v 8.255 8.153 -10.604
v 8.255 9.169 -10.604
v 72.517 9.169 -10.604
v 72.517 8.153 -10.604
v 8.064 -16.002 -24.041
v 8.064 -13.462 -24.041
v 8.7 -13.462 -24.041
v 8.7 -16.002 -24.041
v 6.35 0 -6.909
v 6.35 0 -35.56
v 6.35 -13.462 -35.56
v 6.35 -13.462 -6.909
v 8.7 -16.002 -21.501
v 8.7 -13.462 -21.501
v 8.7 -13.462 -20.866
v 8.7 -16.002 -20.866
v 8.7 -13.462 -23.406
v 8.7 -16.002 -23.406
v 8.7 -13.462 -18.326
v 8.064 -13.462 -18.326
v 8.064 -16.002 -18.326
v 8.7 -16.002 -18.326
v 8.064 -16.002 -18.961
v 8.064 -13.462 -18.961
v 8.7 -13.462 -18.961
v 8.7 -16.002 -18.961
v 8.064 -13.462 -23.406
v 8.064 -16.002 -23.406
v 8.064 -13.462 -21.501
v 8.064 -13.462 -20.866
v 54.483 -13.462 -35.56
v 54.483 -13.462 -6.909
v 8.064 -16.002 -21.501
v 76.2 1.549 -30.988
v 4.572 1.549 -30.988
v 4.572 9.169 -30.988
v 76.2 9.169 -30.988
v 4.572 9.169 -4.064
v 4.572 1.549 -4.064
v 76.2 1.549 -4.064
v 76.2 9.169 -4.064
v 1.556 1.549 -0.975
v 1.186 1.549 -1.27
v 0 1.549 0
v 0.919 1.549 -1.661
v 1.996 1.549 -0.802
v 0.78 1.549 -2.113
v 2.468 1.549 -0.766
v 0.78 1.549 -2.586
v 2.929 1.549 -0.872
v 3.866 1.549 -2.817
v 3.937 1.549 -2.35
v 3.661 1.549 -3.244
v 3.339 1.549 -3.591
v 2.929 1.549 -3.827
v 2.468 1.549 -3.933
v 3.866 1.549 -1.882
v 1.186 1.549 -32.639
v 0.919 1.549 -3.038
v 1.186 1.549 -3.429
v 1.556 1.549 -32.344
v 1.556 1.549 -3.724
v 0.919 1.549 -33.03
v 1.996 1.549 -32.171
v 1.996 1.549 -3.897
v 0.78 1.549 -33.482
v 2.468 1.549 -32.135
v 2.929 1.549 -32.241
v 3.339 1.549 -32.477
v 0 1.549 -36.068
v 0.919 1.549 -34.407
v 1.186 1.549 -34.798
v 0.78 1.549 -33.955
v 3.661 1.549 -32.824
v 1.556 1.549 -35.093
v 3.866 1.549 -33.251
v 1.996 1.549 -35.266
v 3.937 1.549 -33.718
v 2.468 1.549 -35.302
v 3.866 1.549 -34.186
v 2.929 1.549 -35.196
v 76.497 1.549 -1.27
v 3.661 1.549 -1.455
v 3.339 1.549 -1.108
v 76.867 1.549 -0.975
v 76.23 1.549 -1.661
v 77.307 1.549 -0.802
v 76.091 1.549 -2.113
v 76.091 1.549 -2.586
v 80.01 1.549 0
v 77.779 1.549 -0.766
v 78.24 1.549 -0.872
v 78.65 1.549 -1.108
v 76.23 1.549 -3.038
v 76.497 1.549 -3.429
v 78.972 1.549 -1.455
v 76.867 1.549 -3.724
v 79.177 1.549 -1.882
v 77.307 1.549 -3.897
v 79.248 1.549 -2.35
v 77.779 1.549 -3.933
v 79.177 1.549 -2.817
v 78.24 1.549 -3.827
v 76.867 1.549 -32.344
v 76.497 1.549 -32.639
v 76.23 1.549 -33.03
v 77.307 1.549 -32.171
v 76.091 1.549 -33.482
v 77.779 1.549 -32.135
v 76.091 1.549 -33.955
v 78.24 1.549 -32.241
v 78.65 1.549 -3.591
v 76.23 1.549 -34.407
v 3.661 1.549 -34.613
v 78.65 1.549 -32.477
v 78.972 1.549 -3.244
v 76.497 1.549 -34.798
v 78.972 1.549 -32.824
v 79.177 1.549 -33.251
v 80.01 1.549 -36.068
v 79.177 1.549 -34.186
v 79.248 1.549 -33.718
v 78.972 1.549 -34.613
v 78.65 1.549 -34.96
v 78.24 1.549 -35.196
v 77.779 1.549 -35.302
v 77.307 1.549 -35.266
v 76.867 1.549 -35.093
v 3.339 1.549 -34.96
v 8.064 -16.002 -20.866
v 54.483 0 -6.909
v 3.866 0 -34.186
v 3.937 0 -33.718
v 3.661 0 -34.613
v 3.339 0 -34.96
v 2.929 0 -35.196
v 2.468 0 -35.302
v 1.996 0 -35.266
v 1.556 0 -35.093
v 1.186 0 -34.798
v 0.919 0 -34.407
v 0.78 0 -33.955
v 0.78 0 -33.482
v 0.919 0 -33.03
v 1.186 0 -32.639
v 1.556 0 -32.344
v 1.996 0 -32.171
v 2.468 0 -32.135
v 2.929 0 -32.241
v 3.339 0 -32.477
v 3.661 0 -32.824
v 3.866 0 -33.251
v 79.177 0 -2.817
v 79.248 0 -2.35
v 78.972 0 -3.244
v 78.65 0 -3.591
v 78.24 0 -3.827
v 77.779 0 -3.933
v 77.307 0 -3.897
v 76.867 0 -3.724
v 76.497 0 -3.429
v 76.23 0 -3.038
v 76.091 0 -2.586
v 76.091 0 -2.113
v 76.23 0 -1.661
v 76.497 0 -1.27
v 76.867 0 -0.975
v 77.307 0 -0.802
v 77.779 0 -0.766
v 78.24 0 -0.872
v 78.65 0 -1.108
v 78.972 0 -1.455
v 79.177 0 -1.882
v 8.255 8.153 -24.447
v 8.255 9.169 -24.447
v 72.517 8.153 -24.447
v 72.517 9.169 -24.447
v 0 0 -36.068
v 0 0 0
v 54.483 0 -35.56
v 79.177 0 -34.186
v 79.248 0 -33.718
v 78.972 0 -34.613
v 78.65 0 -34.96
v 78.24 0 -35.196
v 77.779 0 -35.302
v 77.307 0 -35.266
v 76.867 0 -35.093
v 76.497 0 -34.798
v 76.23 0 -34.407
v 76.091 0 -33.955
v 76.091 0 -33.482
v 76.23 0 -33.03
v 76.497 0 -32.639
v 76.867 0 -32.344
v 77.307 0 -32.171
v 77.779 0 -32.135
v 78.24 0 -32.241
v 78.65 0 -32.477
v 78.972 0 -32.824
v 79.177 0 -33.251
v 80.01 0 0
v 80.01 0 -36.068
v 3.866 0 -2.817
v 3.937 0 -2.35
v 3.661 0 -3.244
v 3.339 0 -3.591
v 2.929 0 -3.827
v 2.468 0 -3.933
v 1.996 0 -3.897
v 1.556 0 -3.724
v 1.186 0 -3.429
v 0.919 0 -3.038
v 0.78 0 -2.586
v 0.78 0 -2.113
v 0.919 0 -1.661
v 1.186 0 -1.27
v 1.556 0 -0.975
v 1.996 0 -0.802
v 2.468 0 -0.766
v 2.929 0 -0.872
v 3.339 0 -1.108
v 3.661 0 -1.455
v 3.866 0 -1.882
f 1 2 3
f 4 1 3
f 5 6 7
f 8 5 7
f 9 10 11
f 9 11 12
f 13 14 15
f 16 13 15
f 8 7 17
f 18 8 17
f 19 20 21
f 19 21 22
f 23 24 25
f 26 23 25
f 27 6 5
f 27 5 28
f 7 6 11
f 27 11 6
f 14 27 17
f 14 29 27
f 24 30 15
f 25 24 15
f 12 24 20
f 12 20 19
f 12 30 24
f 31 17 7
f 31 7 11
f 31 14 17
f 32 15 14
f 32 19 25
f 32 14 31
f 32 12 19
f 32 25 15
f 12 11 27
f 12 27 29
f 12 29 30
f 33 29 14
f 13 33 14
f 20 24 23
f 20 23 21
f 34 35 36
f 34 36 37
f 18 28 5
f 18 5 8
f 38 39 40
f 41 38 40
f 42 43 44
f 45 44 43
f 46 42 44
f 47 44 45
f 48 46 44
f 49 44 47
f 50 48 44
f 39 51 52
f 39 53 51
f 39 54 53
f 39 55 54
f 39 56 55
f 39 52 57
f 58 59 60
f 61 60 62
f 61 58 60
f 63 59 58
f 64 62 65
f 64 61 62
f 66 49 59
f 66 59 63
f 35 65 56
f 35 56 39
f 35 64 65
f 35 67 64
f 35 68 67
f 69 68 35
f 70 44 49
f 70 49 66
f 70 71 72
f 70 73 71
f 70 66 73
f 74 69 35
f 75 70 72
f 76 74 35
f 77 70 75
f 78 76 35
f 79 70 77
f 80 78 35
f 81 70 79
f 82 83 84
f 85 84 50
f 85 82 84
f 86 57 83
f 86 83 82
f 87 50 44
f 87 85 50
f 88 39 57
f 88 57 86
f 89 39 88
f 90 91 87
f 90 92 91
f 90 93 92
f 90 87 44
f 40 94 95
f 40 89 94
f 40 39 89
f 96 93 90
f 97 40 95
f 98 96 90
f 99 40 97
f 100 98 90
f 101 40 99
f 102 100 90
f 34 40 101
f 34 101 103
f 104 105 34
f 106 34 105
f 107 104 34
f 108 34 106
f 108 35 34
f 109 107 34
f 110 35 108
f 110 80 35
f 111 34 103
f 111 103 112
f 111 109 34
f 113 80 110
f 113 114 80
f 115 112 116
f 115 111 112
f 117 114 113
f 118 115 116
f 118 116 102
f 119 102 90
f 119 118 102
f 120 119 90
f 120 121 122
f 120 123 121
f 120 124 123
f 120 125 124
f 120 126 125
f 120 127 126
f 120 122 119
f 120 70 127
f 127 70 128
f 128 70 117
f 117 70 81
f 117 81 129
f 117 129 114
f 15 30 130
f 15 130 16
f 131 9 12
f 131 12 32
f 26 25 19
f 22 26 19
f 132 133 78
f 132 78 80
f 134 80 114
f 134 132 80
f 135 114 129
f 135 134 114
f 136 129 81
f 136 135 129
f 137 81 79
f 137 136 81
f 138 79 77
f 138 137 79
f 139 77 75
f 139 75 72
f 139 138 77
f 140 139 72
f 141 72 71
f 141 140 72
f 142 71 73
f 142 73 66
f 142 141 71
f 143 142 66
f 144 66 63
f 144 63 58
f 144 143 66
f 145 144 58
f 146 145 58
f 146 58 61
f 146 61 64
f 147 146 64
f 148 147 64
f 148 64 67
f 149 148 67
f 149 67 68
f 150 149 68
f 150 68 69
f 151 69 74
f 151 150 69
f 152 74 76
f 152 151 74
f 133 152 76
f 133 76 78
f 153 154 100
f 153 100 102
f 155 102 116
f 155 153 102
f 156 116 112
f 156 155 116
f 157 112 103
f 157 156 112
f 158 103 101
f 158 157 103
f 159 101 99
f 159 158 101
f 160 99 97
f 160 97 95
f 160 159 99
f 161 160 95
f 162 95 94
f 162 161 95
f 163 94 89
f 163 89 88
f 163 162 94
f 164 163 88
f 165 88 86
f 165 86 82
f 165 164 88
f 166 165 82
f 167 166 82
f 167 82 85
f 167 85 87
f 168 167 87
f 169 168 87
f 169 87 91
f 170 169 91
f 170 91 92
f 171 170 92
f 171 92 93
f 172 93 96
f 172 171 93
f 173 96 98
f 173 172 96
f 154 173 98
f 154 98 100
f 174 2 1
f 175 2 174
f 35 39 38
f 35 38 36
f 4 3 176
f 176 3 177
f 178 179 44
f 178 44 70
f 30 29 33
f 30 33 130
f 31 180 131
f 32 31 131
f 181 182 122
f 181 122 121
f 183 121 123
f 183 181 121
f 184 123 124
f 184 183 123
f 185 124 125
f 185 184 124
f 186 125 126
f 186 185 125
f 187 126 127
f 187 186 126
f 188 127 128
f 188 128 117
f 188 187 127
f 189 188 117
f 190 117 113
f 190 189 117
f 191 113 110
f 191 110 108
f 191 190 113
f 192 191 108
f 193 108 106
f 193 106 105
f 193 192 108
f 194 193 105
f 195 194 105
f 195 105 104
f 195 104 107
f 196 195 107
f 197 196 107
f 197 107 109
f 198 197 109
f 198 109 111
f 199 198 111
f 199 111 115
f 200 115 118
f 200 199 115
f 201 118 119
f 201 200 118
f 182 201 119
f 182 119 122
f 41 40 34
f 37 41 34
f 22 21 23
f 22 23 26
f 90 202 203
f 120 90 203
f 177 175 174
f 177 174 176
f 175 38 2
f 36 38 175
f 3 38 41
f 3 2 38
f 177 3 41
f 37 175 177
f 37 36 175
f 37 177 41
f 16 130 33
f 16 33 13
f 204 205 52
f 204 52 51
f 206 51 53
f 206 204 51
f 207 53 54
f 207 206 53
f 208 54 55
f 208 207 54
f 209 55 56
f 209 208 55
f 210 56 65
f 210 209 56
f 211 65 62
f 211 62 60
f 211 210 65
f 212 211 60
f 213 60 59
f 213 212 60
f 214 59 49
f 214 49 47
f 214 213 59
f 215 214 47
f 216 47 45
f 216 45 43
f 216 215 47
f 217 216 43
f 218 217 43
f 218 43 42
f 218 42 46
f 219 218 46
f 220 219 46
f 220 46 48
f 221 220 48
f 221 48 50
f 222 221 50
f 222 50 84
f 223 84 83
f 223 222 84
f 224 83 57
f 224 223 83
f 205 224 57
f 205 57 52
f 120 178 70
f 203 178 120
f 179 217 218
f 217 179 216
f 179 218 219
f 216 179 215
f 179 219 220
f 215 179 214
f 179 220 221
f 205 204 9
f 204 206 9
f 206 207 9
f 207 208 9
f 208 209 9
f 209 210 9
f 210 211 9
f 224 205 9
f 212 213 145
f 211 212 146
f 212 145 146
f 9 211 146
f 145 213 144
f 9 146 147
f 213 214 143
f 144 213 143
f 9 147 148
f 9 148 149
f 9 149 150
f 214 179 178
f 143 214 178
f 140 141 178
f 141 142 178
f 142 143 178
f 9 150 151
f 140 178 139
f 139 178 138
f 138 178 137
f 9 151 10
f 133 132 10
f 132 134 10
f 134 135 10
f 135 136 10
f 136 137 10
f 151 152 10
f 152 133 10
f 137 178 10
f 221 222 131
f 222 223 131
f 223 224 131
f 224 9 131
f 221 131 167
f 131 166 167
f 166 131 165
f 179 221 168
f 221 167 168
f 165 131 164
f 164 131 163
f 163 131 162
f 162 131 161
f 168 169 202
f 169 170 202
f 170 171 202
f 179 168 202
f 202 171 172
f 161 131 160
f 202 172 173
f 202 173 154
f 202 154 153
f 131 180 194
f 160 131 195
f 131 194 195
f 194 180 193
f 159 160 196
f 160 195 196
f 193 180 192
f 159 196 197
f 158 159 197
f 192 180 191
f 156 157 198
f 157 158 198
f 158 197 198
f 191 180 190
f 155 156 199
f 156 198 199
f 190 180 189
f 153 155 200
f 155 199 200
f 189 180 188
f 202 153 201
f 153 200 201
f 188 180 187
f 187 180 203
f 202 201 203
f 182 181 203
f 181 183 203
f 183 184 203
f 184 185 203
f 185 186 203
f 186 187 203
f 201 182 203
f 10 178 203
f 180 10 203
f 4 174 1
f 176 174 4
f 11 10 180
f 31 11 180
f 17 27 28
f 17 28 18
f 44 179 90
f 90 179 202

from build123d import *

# Parameters (mm, degrees)
SKETCH1_W           = 80.01
SKETCH1_H           = 36.068
SKETCH1_R           = 1.5875
PCB_DEPTH           = 1.5494
SKETCH2_W           = 71.628
SKETCH2_H           = 26.924
BOSS_EXTRUDE2_DEPTH = 7.62
SKETCH3_W           = 64.262
SKETCH3_H           = 13.843
SCREEN_DEPTH        = 1.016
SKETCH4_W           = 48.133
SKETCH4_H           = 28.6512
CIRCUITS_DEPTH      = 13.462
SKETCH5_W           = 0.635
SKETCH5_H           = 0.635
PINS_DEPTH          = 2.54


with BuildPart() as part:
    # Sketch1 → PCB (new body)
    with BuildSketch(Plane(origin=(0, 0, 0), x_dir=(1, 0, 0), z_dir=(0, 1, 0))):
        with Locations((40.005, 18.034)):
            Rectangle(SKETCH1_W, SKETCH1_H)
        with Locations((2.3495, 2.3495)):
            Circle(SKETCH1_R, mode=Mode.SUBTRACT)
        with Locations((77.6605, 2.3495)):
            Circle(SKETCH1_R, mode=Mode.SUBTRACT)
        with Locations((77.6605, 33.7185)):
            Circle(SKETCH1_R, mode=Mode.SUBTRACT)
        with Locations((2.3495, 33.7185)):
            Circle(SKETCH1_R, mode=Mode.SUBTRACT)
    extrude(amount=PCB_DEPTH)

    # Sketch2 → Boss-Extrude2 (add)
    with BuildSketch(Plane(origin=(0, 1.5494, 0), x_dir=(1, 0, 0), z_dir=(0, 1, 0))):
        with Locations((40.386, 17.526)):
            Rectangle(SKETCH2_W, SKETCH2_H)
    extrude(amount=BOSS_EXTRUDE2_DEPTH)

    # Sketch3 → Screen (cut)
    with BuildSketch(Plane(origin=(0, 9.1694, 0), x_dir=(1, 0, 0), z_dir=(0, 1, 0))):
        with Locations((40.386, 17.526)):
            Rectangle(SKETCH3_W, SKETCH3_H)
    extrude(amount=-SCREEN_DEPTH, mode=Mode.SUBTRACT)

    # Sketch4 → Circuits (add)
    with BuildSketch(Plane.XZ):
        with Locations((30.4165, -21.2344)):
            Rectangle(SKETCH4_W, SKETCH4_H)
    extrude(amount=CIRCUITS_DEPTH)

    # Sketch5 → Pins (add)
    with BuildSketch(Plane.XZ.offset(13.462)):
        with Locations((8.382, -18.6436)):
            Rectangle(SKETCH5_W, SKETCH5_H)
        with Locations((8.382, -21.1836)):
            Rectangle(SKETCH5_W, SKETCH5_H)
        with Locations((8.382, -23.7236)):
            Rectangle(SKETCH5_W, SKETCH5_H)
    extrude(amount=PINS_DEPTH)


solid = part.part
